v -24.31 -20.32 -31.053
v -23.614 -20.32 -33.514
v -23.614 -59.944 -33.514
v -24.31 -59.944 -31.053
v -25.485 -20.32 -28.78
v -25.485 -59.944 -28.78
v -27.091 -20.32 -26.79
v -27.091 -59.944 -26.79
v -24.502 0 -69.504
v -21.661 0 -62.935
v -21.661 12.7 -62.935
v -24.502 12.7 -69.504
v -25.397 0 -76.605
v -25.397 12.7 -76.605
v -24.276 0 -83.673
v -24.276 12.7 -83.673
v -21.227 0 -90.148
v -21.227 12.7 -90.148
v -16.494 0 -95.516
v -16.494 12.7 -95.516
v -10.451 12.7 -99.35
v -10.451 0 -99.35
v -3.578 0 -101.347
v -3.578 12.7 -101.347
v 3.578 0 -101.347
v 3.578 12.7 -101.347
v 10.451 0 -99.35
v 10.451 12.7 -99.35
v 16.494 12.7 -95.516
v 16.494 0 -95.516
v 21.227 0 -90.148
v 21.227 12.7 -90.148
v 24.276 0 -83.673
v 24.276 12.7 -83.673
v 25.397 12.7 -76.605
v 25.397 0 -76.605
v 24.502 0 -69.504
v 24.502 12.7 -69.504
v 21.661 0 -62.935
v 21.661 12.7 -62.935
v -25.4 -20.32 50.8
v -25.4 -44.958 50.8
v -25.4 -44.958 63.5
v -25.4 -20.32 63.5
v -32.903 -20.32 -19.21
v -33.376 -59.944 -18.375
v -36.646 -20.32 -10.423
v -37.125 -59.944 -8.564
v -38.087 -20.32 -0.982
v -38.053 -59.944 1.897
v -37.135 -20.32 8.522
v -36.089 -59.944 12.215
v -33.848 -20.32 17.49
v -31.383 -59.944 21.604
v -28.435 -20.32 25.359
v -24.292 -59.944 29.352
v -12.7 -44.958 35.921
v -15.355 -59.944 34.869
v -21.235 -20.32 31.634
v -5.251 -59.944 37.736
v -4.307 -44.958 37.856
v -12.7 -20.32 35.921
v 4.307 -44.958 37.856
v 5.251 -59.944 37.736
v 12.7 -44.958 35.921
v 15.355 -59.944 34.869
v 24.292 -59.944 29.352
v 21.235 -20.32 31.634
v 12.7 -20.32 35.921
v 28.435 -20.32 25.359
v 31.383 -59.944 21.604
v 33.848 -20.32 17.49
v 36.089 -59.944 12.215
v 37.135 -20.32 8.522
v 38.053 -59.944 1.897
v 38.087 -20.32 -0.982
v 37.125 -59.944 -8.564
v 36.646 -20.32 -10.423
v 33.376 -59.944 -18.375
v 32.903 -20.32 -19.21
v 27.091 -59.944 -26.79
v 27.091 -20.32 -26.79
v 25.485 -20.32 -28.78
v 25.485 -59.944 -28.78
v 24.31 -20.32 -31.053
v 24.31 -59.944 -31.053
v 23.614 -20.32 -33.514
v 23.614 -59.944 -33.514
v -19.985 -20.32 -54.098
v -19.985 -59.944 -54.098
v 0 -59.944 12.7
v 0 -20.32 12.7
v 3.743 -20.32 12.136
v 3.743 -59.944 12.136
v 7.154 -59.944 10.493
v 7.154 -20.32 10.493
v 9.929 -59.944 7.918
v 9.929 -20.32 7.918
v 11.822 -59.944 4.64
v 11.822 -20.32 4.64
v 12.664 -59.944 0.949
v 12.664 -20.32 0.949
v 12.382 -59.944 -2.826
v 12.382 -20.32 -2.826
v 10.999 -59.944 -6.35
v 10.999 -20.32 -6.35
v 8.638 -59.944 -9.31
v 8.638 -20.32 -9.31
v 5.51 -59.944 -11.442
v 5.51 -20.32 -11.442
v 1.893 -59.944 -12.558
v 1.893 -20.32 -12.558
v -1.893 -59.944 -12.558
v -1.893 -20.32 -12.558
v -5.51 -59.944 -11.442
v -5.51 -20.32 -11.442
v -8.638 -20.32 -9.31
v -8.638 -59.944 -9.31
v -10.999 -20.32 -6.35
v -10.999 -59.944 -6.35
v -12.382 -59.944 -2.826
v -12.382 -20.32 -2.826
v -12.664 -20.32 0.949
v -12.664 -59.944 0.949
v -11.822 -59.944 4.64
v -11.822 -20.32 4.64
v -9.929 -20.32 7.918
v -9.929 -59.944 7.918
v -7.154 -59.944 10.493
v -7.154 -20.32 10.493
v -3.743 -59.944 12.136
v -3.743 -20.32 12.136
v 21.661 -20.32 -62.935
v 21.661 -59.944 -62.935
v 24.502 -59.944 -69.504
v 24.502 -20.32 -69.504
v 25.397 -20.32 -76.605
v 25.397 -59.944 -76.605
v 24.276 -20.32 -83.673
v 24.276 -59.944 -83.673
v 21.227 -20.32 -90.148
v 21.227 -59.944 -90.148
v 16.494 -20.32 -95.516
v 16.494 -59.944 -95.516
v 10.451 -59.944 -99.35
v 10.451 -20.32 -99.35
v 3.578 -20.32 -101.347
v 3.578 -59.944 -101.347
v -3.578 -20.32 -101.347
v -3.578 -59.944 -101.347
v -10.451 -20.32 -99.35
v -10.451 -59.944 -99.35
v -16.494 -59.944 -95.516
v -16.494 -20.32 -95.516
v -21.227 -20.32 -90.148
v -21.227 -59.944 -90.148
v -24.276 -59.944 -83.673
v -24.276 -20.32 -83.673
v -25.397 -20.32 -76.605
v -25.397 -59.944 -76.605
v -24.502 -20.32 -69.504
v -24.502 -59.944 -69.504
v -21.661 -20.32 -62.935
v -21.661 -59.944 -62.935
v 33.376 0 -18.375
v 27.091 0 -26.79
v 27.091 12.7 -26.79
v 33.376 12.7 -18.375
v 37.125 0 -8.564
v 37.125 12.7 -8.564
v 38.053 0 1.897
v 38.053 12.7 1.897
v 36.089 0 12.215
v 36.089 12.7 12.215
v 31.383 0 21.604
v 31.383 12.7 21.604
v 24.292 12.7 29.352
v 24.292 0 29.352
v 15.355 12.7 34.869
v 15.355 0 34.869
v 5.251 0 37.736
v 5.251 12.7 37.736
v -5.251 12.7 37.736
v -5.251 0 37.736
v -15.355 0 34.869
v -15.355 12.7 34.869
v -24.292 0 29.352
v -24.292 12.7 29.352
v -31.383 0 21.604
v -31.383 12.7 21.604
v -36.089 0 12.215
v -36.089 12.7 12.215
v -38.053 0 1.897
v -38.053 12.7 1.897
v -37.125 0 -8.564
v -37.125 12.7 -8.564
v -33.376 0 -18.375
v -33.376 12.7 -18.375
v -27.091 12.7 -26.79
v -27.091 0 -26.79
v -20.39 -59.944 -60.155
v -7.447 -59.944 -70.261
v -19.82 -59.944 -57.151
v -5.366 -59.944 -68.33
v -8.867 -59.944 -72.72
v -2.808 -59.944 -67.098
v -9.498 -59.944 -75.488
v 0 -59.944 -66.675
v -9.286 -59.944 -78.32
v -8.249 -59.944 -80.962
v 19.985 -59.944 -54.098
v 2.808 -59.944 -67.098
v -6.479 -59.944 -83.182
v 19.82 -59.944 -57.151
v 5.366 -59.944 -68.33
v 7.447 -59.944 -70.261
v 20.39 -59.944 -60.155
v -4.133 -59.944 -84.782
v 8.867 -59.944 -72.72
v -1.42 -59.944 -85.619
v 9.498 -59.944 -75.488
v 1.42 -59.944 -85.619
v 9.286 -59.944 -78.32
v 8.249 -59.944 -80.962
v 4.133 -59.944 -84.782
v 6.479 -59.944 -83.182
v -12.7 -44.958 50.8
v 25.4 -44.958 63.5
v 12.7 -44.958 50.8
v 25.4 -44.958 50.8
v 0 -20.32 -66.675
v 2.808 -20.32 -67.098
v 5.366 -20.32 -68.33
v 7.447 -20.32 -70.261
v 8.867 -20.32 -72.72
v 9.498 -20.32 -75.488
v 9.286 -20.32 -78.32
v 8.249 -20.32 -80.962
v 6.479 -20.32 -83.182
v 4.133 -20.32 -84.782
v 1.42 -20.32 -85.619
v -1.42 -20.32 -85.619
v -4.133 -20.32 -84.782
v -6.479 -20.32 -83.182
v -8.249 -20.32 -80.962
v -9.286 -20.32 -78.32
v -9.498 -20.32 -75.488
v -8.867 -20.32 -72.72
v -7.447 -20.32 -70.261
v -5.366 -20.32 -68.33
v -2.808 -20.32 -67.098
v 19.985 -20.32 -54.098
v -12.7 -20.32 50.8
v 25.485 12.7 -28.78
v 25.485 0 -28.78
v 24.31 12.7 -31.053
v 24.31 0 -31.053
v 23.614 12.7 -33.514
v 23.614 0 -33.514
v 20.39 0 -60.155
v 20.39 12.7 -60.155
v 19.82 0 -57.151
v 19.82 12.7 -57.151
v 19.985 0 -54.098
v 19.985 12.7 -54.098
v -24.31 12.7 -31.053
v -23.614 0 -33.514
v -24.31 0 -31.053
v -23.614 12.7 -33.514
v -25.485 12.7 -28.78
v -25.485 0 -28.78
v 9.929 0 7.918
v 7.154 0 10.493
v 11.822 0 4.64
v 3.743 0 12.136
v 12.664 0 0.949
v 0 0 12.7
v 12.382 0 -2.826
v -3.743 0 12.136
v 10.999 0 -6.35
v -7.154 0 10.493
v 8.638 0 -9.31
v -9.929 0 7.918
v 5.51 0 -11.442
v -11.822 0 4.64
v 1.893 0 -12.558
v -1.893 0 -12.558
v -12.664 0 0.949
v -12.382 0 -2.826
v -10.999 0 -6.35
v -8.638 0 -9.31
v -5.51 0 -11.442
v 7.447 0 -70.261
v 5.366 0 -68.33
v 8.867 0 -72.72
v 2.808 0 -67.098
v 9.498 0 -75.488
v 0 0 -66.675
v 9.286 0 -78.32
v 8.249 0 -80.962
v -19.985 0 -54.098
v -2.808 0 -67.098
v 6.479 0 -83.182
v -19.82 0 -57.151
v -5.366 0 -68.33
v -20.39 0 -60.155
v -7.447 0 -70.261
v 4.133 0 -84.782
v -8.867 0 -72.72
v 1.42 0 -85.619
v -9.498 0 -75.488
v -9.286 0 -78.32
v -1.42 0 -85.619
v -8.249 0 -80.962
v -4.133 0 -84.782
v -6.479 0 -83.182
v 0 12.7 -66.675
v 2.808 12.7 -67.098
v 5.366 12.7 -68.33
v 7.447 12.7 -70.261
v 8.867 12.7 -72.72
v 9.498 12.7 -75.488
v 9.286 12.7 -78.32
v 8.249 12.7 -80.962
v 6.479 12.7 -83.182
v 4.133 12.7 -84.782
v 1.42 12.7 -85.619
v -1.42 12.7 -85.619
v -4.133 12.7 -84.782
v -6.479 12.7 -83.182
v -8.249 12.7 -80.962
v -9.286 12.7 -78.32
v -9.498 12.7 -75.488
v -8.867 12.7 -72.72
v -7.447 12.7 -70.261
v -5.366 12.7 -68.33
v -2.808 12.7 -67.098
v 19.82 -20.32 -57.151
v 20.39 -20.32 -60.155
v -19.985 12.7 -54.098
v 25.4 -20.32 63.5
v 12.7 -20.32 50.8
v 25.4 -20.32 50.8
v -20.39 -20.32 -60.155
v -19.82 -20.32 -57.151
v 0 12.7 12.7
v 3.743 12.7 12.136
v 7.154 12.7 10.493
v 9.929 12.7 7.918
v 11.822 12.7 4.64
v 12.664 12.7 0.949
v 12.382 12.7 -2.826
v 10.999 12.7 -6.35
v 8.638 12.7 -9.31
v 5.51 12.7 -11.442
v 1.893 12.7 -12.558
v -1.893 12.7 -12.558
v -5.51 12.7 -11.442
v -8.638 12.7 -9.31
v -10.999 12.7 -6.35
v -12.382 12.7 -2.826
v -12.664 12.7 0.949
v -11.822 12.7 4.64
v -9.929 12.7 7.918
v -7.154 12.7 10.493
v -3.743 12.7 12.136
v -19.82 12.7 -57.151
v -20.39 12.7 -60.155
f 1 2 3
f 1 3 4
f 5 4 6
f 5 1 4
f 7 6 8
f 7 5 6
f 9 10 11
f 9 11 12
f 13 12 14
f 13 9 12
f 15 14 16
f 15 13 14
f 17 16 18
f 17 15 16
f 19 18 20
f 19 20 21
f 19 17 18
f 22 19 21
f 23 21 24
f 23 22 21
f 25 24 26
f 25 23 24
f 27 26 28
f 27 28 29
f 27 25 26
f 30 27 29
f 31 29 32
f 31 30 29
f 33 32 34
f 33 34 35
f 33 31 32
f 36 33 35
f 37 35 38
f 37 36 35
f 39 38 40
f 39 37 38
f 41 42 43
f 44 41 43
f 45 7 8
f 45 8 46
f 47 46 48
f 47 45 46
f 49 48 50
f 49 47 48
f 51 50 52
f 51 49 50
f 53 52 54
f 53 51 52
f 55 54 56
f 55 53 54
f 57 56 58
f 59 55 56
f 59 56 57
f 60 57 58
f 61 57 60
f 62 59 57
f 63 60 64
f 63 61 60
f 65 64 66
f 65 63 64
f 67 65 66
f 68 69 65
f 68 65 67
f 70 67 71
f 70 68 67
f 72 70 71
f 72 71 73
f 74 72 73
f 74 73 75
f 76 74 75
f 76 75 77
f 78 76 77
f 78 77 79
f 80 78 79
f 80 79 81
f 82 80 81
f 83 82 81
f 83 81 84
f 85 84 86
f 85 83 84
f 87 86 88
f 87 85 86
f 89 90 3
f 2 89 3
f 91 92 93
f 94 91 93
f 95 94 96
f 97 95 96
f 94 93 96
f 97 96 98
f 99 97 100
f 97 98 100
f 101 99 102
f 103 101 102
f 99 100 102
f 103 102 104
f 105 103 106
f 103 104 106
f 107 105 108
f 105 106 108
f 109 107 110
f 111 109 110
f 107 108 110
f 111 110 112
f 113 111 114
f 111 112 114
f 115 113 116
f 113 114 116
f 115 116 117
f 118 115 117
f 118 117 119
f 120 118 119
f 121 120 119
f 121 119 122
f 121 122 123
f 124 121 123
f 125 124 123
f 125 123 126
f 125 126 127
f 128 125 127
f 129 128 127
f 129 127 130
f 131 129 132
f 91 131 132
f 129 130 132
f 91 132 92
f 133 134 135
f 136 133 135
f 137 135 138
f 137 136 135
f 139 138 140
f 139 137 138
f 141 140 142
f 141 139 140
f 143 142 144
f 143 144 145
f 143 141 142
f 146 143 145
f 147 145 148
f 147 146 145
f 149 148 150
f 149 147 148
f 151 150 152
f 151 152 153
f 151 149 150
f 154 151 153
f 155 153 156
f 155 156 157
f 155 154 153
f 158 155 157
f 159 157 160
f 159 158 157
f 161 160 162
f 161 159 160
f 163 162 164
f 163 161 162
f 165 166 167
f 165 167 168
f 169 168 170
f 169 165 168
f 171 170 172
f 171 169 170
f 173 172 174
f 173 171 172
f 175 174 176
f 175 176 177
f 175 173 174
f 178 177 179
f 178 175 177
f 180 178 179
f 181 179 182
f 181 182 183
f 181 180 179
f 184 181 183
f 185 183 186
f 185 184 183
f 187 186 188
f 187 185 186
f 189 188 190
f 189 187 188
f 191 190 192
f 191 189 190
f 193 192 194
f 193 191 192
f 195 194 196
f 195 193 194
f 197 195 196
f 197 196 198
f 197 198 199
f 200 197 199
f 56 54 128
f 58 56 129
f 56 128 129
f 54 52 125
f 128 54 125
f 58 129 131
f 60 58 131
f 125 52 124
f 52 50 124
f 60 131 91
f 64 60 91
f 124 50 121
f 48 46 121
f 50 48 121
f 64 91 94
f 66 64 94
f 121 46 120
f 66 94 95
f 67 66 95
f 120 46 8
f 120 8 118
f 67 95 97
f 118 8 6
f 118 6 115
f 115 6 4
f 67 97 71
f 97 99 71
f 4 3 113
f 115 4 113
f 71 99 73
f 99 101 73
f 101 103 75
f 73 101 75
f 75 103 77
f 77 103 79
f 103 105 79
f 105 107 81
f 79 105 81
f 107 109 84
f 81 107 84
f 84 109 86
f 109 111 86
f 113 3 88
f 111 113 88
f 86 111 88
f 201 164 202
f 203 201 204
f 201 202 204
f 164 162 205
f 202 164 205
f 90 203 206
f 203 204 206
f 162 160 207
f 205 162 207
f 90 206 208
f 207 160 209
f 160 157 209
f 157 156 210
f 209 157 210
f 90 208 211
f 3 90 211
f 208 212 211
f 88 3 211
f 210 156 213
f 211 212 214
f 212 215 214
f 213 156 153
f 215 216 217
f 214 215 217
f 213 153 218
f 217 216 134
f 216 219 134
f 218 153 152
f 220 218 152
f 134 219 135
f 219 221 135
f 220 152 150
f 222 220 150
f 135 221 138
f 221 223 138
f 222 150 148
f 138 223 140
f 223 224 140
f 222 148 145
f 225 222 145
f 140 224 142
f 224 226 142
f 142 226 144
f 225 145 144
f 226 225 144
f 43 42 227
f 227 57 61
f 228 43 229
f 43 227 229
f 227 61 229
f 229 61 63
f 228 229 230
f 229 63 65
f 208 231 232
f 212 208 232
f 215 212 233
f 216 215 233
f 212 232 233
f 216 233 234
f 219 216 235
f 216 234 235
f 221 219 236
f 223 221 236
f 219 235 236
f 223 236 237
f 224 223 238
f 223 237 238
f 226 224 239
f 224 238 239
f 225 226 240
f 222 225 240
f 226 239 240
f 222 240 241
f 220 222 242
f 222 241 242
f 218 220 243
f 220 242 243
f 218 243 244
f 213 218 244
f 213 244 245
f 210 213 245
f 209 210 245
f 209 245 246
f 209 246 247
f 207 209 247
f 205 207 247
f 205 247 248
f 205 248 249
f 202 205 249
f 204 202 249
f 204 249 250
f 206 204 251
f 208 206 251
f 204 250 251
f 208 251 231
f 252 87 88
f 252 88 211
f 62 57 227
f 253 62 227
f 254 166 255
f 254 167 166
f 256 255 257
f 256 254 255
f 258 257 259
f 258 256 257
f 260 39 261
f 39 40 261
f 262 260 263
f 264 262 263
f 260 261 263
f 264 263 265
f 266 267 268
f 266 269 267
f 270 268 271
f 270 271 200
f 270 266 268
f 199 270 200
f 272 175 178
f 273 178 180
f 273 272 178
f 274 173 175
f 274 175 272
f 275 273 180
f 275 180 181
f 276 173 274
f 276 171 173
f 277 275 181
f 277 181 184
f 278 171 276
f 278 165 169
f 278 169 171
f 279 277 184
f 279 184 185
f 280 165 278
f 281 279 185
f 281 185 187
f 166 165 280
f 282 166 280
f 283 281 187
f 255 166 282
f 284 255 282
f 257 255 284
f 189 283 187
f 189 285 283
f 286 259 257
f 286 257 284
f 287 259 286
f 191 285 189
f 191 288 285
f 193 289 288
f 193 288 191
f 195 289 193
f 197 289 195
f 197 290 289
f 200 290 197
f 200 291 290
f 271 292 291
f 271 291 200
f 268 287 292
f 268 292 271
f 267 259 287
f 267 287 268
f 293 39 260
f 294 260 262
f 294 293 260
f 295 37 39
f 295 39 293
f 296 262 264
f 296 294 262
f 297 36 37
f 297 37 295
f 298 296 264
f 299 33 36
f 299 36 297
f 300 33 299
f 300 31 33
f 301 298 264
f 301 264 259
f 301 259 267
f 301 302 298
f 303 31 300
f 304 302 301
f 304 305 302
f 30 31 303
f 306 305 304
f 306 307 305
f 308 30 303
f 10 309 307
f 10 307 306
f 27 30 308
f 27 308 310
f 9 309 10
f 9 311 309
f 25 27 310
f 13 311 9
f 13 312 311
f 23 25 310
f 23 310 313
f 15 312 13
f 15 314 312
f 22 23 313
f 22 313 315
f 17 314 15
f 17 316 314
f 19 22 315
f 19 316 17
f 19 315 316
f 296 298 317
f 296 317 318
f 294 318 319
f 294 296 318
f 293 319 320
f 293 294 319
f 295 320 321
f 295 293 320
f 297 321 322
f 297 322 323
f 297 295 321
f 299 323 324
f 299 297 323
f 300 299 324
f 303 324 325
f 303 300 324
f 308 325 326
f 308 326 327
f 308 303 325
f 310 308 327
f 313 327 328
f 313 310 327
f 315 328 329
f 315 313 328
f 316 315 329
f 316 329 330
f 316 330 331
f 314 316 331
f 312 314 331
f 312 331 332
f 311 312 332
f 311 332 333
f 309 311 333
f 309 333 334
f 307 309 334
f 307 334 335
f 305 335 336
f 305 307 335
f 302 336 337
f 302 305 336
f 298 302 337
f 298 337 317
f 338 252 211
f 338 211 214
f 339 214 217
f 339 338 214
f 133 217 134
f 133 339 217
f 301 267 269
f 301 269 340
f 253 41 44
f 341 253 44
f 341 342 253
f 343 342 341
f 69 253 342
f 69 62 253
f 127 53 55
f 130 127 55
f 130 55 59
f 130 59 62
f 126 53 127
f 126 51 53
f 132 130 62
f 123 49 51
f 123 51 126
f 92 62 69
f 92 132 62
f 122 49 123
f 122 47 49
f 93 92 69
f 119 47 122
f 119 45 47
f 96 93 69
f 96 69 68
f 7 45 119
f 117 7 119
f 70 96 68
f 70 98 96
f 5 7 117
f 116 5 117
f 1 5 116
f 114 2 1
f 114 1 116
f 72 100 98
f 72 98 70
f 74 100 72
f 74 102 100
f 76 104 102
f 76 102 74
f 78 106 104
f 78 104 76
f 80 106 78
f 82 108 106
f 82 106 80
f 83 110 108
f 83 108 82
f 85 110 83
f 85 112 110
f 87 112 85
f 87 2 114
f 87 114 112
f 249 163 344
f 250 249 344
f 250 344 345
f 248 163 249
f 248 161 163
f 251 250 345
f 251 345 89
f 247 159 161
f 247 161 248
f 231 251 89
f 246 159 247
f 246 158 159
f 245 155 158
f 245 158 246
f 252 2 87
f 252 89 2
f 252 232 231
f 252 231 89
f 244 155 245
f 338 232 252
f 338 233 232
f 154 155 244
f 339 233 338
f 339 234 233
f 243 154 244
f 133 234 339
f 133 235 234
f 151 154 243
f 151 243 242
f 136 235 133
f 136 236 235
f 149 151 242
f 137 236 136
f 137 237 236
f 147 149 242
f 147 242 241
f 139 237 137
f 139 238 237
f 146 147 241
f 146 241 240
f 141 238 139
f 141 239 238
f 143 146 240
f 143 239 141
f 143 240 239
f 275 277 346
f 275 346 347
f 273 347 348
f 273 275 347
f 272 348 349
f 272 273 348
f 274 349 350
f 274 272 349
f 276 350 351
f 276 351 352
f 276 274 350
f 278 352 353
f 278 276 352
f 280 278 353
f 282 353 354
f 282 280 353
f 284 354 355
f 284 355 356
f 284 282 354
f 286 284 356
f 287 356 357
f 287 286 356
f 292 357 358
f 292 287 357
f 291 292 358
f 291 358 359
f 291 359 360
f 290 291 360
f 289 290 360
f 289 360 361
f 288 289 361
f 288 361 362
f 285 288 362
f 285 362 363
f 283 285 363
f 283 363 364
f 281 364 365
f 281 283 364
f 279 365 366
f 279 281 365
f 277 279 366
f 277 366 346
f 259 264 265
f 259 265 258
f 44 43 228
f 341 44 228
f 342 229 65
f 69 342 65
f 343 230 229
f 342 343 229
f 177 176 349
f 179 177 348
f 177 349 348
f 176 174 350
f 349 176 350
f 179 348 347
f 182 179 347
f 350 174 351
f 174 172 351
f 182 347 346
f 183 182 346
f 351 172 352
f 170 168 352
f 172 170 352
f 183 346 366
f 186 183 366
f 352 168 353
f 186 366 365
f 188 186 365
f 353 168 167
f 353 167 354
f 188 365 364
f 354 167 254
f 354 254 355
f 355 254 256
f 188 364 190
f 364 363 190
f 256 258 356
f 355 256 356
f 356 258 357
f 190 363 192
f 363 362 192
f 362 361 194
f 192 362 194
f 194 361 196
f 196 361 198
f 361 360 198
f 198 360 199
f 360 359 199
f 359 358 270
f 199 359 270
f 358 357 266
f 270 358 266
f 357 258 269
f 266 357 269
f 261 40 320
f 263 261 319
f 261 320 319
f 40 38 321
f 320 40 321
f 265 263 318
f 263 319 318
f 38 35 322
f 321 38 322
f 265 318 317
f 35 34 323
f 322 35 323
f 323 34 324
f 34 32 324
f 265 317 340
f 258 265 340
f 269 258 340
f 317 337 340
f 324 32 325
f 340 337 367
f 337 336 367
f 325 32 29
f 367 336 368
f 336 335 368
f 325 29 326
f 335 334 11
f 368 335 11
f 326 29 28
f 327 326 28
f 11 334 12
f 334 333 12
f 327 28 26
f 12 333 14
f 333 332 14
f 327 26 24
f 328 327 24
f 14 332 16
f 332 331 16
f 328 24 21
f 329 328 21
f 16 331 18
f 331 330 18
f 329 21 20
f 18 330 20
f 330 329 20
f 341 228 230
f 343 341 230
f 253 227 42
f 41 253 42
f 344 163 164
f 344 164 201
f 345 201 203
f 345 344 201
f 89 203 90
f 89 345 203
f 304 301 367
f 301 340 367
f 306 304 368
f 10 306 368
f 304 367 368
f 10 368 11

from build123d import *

# Parameters (mm, degrees)
SKETCH1_R           = 12.7
SKETCH1_R_2         = 9.525
BOSS_EXTRUDE1_DEPTH = 12.7
FILLET1_R           = 12.7
SKETCH3_R           = 9.525
SKETCH3_R_2         = 12.7
BOSS_EXTRUDE2_DEPTH = 39.624
BOSS_EXTRUDE3_START = -24.638
BOSS_EXTRUDE3_DEPTH = 24.638


with BuildPart() as part:
    # Sketch1 → Boss-Extrude1 (new body)
    with BuildSketch(Plane(origin=(0, 0, 0), x_dir=(1, 0, 0), z_dir=(0, 1, 0))):
        with BuildLine():
            Line((-24.35791626, 29.296790191), (-19.05, 59.399479175))
            ThreePointArc((-19.05, 59.399479175), (0, 101.6), (19.05, 59.399479175))
            Line((19.05, 59.399479175), (24.35791626, 29.296790191))
            ThreePointArc((24.35791626, 29.296790191), (0, -38.1), (-24.35791626, 29.296790191))
        make_face()
        with Locations(Location((0, 0, 0), (0, 0, 270))):
            Circle(SKETCH1_R, mode=Mode.SUBTRACT)
        with Locations(Location((0, 76.2, 0), (0, 0, 270))):
            Circle(SKETCH1_R_2, mode=Mode.SUBTRACT)
    extrude(amount=BOSS_EXTRUDE1_DEPTH)

    # Fillet1
    fillet1_edges = [part.edges().sort_by_distance(p)[0] for p in [
        (19.05, 6.35, -59.399479175),
        (24.35791626, 6.35, -29.296790191),
        (-24.35791626, 6.35, -29.296790191),
        (-19.05, 6.35, -59.399479175),
    ]]
    fillet(fillet1_edges, radius=FILLET1_R)


with BuildPart() as body_2:
    # Sketch3 → Boss-Extrude2 (new body)
    with BuildSketch(Plane(origin=(0, -20.32, 0), x_dir=(1, 0, 0), z_dir=(0, 1, 0))):
        with BuildLine():
            Line((23.614259759, 33.514275782), (19.984835556, 54.097763283))
            ThreePointArc((19.984835556, 54.097763283), (20.01439897, 58.669974371), (21.661262679, 62.935396759))
            ThreePointArc((21.661262679, 62.935396759), (0, 101.6), (-21.661262679, 62.935396759))
            ThreePointArc((-21.661262679, 62.935396759), (-20.01439897, 58.669974371), (-19.984835556, 54.097763283))
            Line((-19.984835556, 54.097763283), (-23.614259759, 33.514275782))
            ThreePointArc((-23.614259759, 33.514275782), (-24.839929511, 29.886917974), (-27.090988667, 26.789705729))
            ThreePointArc((-27.090988667, 26.789705729), (0, -38.1), (27.090988667, 26.789705729))
            ThreePointArc((27.090988667, 26.789705729), (24.839929511, 29.886917974), (23.614259759, 33.514275782))
        make_face()
        with Locations(Location((0, 76.2, 0), (0, 0, 270))):
            Circle(SKETCH3_R, mode=Mode.SUBTRACT)
        with Locations(Location((0, 0, 0), (0, 0, 270))):
            Circle(SKETCH3_R_2, mode=Mode.SUBTRACT)
    extrude(amount=-BOSS_EXTRUDE2_DEPTH)

    # Sketch4 → Boss-Extrude3 (add)
    with BuildSketch(Plane(origin=(0, -20.32, 0), x_dir=(1, 0, 0), z_dir=(0, 1, 0)).offset(BOSS_EXTRUDE3_START)):
        with BuildLine():
            Line((12.7, -50.8), (12.7, -35.921024484))
            ThreePointArc((12.7, -35.921024484), (0, -38.1), (-12.7, -35.921024484))
            Line((-12.7, -35.921024484), (-12.7, -50.8))
            Line((-12.7, -50.8), (-25.4, -50.8))
            Line((-25.4, -50.8), (-25.4, -63.5))
            Line((-25.4, -63.5), (25.4, -63.5))
            Line((25.4, -63.5), (25.4, -50.8))
            Line((25.4, -50.8), (12.7, -50.8))
        make_face()
    extrude(amount=BOSS_EXTRUDE3_DEPTH)


solid = Compound([part.part, body_2.part])
